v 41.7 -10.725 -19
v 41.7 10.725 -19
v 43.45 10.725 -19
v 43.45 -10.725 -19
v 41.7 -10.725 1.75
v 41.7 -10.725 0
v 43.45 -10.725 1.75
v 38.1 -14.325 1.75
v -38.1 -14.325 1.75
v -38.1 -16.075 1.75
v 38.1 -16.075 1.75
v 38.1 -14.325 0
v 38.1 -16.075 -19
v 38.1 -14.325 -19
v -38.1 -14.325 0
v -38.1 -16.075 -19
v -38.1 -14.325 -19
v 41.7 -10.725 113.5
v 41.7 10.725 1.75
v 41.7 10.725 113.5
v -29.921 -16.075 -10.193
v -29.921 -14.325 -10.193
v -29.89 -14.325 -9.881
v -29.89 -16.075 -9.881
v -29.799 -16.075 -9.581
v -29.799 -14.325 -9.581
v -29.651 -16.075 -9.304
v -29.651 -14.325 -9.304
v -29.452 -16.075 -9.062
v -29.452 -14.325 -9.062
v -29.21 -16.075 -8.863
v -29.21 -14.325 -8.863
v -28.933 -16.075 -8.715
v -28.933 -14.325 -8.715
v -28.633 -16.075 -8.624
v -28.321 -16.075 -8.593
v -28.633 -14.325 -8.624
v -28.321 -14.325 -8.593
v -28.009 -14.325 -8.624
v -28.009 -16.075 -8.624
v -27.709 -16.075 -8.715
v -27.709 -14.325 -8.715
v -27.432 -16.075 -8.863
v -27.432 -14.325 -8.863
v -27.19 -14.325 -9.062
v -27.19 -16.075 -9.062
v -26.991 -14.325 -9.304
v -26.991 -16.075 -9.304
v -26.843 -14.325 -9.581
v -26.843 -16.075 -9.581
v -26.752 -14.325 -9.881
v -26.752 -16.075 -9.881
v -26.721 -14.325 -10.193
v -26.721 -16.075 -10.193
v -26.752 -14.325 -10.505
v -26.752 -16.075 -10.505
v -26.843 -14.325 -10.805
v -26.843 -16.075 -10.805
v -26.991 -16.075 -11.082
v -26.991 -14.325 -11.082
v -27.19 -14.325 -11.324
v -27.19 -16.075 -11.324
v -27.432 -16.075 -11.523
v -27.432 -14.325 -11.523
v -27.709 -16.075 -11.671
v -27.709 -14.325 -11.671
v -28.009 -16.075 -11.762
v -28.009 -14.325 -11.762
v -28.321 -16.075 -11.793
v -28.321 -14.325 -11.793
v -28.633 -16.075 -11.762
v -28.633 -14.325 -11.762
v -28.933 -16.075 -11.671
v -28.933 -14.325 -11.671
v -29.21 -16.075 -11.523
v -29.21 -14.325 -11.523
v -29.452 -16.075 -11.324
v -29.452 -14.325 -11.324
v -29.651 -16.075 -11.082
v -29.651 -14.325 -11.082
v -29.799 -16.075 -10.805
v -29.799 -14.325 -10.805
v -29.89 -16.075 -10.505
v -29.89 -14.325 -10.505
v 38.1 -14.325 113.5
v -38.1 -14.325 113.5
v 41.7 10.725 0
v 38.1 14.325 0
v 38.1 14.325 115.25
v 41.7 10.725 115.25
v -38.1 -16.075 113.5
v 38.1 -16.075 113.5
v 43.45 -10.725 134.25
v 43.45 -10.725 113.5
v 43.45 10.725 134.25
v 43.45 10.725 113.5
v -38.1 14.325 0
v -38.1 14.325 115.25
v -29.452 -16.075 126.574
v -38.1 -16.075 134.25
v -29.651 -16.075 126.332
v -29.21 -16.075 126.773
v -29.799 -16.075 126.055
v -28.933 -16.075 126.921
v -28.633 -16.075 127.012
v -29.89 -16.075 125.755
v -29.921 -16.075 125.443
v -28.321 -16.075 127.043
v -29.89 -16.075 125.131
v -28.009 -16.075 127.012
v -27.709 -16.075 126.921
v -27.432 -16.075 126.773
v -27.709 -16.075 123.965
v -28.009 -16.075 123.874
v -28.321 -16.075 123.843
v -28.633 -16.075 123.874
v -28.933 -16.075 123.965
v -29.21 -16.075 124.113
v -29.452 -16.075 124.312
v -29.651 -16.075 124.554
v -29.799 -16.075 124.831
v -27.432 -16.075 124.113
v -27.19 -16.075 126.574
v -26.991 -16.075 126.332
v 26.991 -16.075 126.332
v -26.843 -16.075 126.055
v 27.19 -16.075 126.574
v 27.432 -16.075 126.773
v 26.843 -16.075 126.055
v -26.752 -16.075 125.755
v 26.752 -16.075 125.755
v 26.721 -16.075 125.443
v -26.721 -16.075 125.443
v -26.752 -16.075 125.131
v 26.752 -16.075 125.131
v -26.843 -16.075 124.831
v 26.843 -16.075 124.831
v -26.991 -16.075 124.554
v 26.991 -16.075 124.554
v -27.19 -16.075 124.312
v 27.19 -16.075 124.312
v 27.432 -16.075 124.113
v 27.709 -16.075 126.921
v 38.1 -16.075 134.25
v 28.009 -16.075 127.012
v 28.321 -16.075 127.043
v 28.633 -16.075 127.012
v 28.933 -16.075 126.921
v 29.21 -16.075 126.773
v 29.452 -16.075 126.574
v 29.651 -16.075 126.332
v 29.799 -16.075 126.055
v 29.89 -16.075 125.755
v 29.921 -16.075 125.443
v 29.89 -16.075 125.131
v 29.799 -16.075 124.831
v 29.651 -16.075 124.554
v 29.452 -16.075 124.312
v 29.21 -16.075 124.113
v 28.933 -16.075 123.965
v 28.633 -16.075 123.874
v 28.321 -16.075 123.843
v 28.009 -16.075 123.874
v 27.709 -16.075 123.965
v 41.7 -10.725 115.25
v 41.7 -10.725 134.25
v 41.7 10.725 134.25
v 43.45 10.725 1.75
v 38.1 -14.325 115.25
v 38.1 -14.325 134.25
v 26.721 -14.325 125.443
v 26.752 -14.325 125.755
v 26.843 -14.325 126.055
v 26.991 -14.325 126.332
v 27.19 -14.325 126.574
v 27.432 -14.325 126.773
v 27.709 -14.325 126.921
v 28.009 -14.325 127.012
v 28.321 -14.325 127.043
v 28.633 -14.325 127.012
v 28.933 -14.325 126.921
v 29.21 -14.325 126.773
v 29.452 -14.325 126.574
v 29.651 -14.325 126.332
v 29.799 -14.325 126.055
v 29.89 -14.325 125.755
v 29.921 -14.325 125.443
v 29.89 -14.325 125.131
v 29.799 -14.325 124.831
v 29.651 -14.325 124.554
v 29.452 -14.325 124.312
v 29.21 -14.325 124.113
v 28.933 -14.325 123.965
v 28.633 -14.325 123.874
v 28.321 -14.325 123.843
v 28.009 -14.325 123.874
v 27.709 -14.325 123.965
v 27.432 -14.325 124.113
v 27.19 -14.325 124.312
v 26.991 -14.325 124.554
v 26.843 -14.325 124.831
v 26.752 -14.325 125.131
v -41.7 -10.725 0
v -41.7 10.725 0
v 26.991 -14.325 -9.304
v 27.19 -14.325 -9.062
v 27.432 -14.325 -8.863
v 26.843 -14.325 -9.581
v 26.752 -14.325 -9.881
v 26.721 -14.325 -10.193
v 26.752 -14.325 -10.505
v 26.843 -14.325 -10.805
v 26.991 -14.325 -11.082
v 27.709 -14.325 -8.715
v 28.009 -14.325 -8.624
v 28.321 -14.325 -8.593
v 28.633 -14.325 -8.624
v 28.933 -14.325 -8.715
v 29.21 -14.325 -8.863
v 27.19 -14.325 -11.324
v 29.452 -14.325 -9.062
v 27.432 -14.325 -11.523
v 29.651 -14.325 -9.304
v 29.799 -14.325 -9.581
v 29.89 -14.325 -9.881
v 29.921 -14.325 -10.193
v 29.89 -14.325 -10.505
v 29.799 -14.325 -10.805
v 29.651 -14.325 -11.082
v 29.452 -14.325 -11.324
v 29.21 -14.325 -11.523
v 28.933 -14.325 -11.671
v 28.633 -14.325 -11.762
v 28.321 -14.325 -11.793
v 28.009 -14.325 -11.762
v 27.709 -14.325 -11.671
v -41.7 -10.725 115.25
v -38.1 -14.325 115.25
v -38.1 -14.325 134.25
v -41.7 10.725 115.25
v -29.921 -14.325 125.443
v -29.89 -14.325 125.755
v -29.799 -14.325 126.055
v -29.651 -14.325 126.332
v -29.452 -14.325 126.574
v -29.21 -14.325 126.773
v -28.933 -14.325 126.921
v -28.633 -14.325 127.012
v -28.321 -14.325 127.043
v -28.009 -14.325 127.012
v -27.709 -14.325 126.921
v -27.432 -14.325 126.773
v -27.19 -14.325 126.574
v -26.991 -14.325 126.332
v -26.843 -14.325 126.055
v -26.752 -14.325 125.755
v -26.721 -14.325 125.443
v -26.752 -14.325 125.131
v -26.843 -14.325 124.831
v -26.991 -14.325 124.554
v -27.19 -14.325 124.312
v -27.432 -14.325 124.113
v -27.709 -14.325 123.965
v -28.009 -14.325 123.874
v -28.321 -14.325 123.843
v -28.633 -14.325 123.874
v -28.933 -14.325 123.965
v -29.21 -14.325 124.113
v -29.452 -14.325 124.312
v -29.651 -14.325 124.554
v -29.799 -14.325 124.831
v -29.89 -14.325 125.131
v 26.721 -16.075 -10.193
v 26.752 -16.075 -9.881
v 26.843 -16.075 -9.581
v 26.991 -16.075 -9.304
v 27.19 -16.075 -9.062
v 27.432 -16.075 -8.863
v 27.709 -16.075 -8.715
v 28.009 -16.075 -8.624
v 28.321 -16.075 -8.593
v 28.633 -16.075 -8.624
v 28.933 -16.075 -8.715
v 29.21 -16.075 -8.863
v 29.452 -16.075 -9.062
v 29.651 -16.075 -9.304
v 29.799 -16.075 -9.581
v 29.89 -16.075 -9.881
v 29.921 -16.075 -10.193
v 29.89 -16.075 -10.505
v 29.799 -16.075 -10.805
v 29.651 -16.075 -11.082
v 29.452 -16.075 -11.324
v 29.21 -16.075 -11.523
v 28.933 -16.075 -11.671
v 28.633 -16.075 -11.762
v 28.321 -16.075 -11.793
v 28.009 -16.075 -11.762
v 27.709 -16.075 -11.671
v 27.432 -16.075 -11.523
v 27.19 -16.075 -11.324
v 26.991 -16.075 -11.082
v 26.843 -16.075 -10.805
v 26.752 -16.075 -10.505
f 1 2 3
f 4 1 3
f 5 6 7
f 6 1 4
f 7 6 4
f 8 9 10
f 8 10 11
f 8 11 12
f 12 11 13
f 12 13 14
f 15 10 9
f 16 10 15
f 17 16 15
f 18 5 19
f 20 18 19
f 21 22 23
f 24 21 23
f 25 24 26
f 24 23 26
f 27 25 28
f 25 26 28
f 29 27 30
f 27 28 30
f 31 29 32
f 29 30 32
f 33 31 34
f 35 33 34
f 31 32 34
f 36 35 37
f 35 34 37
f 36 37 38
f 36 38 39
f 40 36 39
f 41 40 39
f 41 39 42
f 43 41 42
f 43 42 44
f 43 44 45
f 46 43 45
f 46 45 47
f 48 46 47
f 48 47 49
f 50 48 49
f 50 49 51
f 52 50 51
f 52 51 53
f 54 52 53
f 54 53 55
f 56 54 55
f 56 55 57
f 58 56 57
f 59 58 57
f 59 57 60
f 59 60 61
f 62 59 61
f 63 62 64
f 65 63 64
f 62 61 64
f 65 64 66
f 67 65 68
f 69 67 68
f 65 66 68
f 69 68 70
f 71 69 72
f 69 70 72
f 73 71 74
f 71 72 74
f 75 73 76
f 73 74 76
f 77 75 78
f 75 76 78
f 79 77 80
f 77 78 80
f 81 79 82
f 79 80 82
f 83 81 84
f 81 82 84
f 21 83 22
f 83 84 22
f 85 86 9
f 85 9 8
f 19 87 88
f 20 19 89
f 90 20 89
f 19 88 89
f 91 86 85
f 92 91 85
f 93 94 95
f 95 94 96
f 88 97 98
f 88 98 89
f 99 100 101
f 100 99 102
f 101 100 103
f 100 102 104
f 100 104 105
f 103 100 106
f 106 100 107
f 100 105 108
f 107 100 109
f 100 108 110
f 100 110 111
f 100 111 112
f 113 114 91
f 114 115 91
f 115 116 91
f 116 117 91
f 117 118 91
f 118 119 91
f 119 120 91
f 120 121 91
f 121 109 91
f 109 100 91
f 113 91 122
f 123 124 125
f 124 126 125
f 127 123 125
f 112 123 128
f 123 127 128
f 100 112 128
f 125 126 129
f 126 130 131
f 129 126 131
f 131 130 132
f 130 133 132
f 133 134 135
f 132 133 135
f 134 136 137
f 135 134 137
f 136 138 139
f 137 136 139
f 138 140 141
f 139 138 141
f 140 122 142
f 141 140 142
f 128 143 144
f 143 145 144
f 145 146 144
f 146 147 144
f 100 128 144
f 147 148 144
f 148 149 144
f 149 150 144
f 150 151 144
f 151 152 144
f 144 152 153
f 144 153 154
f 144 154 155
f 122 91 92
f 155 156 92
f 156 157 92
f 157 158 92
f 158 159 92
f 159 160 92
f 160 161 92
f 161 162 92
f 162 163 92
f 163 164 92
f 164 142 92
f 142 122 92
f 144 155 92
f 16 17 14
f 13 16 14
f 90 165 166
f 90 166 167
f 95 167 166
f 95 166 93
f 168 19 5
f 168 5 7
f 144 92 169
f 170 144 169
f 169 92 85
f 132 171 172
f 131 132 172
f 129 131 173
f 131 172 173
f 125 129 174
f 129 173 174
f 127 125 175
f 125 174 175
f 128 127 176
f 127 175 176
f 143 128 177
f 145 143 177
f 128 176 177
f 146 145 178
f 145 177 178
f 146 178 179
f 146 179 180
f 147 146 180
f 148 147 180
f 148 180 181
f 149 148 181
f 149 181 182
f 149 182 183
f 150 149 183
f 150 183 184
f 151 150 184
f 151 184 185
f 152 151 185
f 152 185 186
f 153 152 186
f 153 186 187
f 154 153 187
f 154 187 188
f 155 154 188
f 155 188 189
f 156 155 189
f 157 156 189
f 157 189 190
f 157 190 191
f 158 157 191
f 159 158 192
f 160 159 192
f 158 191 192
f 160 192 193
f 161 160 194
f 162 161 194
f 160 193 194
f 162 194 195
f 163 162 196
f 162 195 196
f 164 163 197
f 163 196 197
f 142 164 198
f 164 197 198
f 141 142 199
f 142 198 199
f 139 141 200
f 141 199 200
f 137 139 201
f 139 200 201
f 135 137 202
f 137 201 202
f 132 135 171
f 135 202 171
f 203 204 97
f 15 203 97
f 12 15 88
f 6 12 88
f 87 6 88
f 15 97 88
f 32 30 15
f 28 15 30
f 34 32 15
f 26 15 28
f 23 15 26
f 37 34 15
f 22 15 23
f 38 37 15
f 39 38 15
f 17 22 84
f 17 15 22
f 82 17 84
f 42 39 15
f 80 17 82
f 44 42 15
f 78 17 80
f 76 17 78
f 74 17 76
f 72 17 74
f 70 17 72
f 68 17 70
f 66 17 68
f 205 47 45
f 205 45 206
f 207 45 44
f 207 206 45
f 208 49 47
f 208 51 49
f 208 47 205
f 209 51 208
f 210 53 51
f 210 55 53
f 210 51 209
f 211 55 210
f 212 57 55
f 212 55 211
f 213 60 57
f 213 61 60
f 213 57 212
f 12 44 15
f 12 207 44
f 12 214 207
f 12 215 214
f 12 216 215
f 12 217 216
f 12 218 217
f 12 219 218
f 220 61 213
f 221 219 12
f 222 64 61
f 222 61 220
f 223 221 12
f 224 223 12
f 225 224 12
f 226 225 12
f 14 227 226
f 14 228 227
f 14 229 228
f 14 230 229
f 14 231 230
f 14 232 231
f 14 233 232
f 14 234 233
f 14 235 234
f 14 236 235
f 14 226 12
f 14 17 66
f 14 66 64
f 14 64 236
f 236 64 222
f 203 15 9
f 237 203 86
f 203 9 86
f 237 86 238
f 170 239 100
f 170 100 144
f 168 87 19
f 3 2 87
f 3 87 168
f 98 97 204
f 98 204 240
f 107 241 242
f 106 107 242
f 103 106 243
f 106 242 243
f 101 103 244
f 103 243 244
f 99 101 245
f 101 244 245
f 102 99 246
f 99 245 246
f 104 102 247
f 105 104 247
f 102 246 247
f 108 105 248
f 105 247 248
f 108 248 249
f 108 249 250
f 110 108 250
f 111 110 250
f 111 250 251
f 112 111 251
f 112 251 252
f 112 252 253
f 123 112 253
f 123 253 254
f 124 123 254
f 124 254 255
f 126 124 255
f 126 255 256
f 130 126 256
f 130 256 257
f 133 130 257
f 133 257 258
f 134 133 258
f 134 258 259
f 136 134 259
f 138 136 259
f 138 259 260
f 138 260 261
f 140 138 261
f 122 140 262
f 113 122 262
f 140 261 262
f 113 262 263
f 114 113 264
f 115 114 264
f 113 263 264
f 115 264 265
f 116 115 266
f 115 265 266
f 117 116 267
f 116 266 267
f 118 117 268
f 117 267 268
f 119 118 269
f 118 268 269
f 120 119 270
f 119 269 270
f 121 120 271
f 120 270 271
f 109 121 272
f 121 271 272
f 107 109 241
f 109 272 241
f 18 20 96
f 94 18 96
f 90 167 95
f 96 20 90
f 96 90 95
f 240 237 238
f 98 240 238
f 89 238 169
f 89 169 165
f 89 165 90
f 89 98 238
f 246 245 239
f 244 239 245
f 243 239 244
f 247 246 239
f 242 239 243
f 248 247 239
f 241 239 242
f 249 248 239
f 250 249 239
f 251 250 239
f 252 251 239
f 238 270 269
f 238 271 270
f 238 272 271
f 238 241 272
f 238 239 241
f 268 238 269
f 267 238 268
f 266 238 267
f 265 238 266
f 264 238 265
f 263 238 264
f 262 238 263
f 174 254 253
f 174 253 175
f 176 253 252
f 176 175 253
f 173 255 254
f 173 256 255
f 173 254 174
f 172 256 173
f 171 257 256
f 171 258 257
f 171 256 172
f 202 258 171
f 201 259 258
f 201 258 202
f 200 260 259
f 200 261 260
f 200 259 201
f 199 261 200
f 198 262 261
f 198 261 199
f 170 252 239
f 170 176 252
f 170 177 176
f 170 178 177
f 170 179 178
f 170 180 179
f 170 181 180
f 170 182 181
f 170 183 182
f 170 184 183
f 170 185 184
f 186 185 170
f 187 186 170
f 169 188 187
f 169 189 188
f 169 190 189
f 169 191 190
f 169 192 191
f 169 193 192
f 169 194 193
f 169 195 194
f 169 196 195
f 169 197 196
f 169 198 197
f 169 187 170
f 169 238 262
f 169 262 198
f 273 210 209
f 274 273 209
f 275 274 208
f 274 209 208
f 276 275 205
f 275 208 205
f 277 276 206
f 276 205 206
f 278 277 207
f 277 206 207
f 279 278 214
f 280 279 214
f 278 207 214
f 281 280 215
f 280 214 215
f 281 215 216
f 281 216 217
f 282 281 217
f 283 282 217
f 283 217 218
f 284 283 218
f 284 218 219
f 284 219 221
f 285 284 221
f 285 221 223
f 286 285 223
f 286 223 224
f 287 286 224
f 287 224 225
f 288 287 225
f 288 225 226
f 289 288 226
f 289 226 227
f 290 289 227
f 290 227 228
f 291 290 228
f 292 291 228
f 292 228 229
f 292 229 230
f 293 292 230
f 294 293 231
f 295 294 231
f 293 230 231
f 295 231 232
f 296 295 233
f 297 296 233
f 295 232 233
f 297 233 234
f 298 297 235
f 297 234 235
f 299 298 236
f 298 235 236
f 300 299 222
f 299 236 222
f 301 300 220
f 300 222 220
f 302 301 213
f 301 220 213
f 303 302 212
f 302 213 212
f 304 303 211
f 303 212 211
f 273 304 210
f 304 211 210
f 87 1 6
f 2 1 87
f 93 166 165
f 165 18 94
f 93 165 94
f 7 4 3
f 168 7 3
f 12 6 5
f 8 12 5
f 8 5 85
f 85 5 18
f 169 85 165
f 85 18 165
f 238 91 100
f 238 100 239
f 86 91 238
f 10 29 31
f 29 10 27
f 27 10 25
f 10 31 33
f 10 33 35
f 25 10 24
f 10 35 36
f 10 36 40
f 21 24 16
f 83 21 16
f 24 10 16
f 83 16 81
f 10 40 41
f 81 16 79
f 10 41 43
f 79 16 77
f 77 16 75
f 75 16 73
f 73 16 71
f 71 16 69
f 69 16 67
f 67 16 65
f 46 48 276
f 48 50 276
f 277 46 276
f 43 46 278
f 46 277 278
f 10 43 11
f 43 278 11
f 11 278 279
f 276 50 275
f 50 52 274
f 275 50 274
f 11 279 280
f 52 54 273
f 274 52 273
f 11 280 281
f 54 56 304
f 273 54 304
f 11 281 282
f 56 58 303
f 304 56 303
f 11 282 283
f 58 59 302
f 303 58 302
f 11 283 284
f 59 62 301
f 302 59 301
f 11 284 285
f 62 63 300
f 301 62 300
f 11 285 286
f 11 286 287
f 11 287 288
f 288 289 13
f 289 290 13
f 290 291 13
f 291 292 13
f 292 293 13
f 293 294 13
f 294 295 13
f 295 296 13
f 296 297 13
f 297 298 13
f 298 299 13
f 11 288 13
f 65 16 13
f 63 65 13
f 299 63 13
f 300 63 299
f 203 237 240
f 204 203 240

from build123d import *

# Parameters (mm, degrees)
SKETCH1_W                = 83.4
SKETCH1_H                = 28.65
BOSS_EXTRUDE1_DEPTH      = 115.25
CHAMFER1_SIZE            = 3.6
BOSS_EXTRUDE2_DEPTH      = 19
BOSS_EXTRUDE2_DEPTH_BACK = 1.75
SKETCH2_W                = 1.75
SKETCH2_H                = 21.45
SKETCH2_W_2              = 76.2
SKETCH2_H_2              = 1.75
BOSS_EXTRUDE4_DEPTH      = 1.75
BOSS_EXTRUDE4_DEPTH_BACK = 19
BOSS_EXTRUDE4_START      = -115.25
SKETCH2_2_W              = 1.75
SKETCH2_2_H              = 21.45
SKETCH2_2_W_2            = 76.2
SKETCH2_2_H_2            = 1.75
SKETCH3_R                = 1.6
CUT_EXTRUDE1_DEPTH       = 144.985372521


with BuildPart() as part:
    # Sketch1 → Boss-Extrude1 (new body)
    with BuildSketch(Plane.XY):
        Rectangle(SKETCH1_W, SKETCH1_H)
    extrude(amount=BOSS_EXTRUDE1_DEPTH)

    # Chamfer1
    chamfer1_edges = [part.edges().sort_by_distance(p)[0] for p in [
        (-41.7, -14.325, 57.625),
        (41.7, -14.325, 57.625),
        (41.7, 14.325, 57.625),
        (-41.7, 14.325, 57.625),
    ]]
    chamfer(chamfer1_edges, length=CHAMFER1_SIZE)

    # Sketch2 → Boss-Extrude2 (add, two sides: drawn at the far end of the back side and taken through both)
    with BuildSketch(Plane.XY.offset(115.25).offset(-BOSS_EXTRUDE2_DEPTH_BACK)):
        with Locations((42.575, 0)):
            Rectangle(SKETCH2_W, SKETCH2_H)
        with Locations((0, -15.2)):
            Rectangle(SKETCH2_W_2, SKETCH2_H_2)
    extrude(amount=BOSS_EXTRUDE2_DEPTH + BOSS_EXTRUDE2_DEPTH_BACK)

    # Sketch2<2> → Boss-Extrude4 (add, two sides: drawn at the far end of the back side and taken through both)
    with BuildSketch(Plane.XY.offset(115.25).offset(BOSS_EXTRUDE4_START - BOSS_EXTRUDE4_DEPTH_BACK)):
        with Locations((42.575, 0)):
            Rectangle(SKETCH2_2_W, SKETCH2_2_H)
        with Locations((0, -15.2)):
            Rectangle(SKETCH2_2_W_2, SKETCH2_2_H_2)
    extrude(amount=BOSS_EXTRUDE4_DEPTH + BOSS_EXTRUDE4_DEPTH_BACK)

    # Sketch3 → Cut-Extrude1 (cut, through all)
    with BuildSketch(Plane(origin=(0, -14.325, 0), x_dir=(1, 0, 0), z_dir=(0, 1, 0))):
        with Locations((-28.321, 10.193)):
            Circle(SKETCH3_R)
        with Locations((28.321, 10.193)):
            Circle(SKETCH3_R)
        with Locations((28.321, -125.443)):
            Circle(SKETCH3_R)
        with Locations((-28.321, -125.443)):
            Circle(SKETCH3_R)
    extrude(amount=-CUT_EXTRUDE1_DEPTH, mode=Mode.SUBTRACT)


solid = part.part
